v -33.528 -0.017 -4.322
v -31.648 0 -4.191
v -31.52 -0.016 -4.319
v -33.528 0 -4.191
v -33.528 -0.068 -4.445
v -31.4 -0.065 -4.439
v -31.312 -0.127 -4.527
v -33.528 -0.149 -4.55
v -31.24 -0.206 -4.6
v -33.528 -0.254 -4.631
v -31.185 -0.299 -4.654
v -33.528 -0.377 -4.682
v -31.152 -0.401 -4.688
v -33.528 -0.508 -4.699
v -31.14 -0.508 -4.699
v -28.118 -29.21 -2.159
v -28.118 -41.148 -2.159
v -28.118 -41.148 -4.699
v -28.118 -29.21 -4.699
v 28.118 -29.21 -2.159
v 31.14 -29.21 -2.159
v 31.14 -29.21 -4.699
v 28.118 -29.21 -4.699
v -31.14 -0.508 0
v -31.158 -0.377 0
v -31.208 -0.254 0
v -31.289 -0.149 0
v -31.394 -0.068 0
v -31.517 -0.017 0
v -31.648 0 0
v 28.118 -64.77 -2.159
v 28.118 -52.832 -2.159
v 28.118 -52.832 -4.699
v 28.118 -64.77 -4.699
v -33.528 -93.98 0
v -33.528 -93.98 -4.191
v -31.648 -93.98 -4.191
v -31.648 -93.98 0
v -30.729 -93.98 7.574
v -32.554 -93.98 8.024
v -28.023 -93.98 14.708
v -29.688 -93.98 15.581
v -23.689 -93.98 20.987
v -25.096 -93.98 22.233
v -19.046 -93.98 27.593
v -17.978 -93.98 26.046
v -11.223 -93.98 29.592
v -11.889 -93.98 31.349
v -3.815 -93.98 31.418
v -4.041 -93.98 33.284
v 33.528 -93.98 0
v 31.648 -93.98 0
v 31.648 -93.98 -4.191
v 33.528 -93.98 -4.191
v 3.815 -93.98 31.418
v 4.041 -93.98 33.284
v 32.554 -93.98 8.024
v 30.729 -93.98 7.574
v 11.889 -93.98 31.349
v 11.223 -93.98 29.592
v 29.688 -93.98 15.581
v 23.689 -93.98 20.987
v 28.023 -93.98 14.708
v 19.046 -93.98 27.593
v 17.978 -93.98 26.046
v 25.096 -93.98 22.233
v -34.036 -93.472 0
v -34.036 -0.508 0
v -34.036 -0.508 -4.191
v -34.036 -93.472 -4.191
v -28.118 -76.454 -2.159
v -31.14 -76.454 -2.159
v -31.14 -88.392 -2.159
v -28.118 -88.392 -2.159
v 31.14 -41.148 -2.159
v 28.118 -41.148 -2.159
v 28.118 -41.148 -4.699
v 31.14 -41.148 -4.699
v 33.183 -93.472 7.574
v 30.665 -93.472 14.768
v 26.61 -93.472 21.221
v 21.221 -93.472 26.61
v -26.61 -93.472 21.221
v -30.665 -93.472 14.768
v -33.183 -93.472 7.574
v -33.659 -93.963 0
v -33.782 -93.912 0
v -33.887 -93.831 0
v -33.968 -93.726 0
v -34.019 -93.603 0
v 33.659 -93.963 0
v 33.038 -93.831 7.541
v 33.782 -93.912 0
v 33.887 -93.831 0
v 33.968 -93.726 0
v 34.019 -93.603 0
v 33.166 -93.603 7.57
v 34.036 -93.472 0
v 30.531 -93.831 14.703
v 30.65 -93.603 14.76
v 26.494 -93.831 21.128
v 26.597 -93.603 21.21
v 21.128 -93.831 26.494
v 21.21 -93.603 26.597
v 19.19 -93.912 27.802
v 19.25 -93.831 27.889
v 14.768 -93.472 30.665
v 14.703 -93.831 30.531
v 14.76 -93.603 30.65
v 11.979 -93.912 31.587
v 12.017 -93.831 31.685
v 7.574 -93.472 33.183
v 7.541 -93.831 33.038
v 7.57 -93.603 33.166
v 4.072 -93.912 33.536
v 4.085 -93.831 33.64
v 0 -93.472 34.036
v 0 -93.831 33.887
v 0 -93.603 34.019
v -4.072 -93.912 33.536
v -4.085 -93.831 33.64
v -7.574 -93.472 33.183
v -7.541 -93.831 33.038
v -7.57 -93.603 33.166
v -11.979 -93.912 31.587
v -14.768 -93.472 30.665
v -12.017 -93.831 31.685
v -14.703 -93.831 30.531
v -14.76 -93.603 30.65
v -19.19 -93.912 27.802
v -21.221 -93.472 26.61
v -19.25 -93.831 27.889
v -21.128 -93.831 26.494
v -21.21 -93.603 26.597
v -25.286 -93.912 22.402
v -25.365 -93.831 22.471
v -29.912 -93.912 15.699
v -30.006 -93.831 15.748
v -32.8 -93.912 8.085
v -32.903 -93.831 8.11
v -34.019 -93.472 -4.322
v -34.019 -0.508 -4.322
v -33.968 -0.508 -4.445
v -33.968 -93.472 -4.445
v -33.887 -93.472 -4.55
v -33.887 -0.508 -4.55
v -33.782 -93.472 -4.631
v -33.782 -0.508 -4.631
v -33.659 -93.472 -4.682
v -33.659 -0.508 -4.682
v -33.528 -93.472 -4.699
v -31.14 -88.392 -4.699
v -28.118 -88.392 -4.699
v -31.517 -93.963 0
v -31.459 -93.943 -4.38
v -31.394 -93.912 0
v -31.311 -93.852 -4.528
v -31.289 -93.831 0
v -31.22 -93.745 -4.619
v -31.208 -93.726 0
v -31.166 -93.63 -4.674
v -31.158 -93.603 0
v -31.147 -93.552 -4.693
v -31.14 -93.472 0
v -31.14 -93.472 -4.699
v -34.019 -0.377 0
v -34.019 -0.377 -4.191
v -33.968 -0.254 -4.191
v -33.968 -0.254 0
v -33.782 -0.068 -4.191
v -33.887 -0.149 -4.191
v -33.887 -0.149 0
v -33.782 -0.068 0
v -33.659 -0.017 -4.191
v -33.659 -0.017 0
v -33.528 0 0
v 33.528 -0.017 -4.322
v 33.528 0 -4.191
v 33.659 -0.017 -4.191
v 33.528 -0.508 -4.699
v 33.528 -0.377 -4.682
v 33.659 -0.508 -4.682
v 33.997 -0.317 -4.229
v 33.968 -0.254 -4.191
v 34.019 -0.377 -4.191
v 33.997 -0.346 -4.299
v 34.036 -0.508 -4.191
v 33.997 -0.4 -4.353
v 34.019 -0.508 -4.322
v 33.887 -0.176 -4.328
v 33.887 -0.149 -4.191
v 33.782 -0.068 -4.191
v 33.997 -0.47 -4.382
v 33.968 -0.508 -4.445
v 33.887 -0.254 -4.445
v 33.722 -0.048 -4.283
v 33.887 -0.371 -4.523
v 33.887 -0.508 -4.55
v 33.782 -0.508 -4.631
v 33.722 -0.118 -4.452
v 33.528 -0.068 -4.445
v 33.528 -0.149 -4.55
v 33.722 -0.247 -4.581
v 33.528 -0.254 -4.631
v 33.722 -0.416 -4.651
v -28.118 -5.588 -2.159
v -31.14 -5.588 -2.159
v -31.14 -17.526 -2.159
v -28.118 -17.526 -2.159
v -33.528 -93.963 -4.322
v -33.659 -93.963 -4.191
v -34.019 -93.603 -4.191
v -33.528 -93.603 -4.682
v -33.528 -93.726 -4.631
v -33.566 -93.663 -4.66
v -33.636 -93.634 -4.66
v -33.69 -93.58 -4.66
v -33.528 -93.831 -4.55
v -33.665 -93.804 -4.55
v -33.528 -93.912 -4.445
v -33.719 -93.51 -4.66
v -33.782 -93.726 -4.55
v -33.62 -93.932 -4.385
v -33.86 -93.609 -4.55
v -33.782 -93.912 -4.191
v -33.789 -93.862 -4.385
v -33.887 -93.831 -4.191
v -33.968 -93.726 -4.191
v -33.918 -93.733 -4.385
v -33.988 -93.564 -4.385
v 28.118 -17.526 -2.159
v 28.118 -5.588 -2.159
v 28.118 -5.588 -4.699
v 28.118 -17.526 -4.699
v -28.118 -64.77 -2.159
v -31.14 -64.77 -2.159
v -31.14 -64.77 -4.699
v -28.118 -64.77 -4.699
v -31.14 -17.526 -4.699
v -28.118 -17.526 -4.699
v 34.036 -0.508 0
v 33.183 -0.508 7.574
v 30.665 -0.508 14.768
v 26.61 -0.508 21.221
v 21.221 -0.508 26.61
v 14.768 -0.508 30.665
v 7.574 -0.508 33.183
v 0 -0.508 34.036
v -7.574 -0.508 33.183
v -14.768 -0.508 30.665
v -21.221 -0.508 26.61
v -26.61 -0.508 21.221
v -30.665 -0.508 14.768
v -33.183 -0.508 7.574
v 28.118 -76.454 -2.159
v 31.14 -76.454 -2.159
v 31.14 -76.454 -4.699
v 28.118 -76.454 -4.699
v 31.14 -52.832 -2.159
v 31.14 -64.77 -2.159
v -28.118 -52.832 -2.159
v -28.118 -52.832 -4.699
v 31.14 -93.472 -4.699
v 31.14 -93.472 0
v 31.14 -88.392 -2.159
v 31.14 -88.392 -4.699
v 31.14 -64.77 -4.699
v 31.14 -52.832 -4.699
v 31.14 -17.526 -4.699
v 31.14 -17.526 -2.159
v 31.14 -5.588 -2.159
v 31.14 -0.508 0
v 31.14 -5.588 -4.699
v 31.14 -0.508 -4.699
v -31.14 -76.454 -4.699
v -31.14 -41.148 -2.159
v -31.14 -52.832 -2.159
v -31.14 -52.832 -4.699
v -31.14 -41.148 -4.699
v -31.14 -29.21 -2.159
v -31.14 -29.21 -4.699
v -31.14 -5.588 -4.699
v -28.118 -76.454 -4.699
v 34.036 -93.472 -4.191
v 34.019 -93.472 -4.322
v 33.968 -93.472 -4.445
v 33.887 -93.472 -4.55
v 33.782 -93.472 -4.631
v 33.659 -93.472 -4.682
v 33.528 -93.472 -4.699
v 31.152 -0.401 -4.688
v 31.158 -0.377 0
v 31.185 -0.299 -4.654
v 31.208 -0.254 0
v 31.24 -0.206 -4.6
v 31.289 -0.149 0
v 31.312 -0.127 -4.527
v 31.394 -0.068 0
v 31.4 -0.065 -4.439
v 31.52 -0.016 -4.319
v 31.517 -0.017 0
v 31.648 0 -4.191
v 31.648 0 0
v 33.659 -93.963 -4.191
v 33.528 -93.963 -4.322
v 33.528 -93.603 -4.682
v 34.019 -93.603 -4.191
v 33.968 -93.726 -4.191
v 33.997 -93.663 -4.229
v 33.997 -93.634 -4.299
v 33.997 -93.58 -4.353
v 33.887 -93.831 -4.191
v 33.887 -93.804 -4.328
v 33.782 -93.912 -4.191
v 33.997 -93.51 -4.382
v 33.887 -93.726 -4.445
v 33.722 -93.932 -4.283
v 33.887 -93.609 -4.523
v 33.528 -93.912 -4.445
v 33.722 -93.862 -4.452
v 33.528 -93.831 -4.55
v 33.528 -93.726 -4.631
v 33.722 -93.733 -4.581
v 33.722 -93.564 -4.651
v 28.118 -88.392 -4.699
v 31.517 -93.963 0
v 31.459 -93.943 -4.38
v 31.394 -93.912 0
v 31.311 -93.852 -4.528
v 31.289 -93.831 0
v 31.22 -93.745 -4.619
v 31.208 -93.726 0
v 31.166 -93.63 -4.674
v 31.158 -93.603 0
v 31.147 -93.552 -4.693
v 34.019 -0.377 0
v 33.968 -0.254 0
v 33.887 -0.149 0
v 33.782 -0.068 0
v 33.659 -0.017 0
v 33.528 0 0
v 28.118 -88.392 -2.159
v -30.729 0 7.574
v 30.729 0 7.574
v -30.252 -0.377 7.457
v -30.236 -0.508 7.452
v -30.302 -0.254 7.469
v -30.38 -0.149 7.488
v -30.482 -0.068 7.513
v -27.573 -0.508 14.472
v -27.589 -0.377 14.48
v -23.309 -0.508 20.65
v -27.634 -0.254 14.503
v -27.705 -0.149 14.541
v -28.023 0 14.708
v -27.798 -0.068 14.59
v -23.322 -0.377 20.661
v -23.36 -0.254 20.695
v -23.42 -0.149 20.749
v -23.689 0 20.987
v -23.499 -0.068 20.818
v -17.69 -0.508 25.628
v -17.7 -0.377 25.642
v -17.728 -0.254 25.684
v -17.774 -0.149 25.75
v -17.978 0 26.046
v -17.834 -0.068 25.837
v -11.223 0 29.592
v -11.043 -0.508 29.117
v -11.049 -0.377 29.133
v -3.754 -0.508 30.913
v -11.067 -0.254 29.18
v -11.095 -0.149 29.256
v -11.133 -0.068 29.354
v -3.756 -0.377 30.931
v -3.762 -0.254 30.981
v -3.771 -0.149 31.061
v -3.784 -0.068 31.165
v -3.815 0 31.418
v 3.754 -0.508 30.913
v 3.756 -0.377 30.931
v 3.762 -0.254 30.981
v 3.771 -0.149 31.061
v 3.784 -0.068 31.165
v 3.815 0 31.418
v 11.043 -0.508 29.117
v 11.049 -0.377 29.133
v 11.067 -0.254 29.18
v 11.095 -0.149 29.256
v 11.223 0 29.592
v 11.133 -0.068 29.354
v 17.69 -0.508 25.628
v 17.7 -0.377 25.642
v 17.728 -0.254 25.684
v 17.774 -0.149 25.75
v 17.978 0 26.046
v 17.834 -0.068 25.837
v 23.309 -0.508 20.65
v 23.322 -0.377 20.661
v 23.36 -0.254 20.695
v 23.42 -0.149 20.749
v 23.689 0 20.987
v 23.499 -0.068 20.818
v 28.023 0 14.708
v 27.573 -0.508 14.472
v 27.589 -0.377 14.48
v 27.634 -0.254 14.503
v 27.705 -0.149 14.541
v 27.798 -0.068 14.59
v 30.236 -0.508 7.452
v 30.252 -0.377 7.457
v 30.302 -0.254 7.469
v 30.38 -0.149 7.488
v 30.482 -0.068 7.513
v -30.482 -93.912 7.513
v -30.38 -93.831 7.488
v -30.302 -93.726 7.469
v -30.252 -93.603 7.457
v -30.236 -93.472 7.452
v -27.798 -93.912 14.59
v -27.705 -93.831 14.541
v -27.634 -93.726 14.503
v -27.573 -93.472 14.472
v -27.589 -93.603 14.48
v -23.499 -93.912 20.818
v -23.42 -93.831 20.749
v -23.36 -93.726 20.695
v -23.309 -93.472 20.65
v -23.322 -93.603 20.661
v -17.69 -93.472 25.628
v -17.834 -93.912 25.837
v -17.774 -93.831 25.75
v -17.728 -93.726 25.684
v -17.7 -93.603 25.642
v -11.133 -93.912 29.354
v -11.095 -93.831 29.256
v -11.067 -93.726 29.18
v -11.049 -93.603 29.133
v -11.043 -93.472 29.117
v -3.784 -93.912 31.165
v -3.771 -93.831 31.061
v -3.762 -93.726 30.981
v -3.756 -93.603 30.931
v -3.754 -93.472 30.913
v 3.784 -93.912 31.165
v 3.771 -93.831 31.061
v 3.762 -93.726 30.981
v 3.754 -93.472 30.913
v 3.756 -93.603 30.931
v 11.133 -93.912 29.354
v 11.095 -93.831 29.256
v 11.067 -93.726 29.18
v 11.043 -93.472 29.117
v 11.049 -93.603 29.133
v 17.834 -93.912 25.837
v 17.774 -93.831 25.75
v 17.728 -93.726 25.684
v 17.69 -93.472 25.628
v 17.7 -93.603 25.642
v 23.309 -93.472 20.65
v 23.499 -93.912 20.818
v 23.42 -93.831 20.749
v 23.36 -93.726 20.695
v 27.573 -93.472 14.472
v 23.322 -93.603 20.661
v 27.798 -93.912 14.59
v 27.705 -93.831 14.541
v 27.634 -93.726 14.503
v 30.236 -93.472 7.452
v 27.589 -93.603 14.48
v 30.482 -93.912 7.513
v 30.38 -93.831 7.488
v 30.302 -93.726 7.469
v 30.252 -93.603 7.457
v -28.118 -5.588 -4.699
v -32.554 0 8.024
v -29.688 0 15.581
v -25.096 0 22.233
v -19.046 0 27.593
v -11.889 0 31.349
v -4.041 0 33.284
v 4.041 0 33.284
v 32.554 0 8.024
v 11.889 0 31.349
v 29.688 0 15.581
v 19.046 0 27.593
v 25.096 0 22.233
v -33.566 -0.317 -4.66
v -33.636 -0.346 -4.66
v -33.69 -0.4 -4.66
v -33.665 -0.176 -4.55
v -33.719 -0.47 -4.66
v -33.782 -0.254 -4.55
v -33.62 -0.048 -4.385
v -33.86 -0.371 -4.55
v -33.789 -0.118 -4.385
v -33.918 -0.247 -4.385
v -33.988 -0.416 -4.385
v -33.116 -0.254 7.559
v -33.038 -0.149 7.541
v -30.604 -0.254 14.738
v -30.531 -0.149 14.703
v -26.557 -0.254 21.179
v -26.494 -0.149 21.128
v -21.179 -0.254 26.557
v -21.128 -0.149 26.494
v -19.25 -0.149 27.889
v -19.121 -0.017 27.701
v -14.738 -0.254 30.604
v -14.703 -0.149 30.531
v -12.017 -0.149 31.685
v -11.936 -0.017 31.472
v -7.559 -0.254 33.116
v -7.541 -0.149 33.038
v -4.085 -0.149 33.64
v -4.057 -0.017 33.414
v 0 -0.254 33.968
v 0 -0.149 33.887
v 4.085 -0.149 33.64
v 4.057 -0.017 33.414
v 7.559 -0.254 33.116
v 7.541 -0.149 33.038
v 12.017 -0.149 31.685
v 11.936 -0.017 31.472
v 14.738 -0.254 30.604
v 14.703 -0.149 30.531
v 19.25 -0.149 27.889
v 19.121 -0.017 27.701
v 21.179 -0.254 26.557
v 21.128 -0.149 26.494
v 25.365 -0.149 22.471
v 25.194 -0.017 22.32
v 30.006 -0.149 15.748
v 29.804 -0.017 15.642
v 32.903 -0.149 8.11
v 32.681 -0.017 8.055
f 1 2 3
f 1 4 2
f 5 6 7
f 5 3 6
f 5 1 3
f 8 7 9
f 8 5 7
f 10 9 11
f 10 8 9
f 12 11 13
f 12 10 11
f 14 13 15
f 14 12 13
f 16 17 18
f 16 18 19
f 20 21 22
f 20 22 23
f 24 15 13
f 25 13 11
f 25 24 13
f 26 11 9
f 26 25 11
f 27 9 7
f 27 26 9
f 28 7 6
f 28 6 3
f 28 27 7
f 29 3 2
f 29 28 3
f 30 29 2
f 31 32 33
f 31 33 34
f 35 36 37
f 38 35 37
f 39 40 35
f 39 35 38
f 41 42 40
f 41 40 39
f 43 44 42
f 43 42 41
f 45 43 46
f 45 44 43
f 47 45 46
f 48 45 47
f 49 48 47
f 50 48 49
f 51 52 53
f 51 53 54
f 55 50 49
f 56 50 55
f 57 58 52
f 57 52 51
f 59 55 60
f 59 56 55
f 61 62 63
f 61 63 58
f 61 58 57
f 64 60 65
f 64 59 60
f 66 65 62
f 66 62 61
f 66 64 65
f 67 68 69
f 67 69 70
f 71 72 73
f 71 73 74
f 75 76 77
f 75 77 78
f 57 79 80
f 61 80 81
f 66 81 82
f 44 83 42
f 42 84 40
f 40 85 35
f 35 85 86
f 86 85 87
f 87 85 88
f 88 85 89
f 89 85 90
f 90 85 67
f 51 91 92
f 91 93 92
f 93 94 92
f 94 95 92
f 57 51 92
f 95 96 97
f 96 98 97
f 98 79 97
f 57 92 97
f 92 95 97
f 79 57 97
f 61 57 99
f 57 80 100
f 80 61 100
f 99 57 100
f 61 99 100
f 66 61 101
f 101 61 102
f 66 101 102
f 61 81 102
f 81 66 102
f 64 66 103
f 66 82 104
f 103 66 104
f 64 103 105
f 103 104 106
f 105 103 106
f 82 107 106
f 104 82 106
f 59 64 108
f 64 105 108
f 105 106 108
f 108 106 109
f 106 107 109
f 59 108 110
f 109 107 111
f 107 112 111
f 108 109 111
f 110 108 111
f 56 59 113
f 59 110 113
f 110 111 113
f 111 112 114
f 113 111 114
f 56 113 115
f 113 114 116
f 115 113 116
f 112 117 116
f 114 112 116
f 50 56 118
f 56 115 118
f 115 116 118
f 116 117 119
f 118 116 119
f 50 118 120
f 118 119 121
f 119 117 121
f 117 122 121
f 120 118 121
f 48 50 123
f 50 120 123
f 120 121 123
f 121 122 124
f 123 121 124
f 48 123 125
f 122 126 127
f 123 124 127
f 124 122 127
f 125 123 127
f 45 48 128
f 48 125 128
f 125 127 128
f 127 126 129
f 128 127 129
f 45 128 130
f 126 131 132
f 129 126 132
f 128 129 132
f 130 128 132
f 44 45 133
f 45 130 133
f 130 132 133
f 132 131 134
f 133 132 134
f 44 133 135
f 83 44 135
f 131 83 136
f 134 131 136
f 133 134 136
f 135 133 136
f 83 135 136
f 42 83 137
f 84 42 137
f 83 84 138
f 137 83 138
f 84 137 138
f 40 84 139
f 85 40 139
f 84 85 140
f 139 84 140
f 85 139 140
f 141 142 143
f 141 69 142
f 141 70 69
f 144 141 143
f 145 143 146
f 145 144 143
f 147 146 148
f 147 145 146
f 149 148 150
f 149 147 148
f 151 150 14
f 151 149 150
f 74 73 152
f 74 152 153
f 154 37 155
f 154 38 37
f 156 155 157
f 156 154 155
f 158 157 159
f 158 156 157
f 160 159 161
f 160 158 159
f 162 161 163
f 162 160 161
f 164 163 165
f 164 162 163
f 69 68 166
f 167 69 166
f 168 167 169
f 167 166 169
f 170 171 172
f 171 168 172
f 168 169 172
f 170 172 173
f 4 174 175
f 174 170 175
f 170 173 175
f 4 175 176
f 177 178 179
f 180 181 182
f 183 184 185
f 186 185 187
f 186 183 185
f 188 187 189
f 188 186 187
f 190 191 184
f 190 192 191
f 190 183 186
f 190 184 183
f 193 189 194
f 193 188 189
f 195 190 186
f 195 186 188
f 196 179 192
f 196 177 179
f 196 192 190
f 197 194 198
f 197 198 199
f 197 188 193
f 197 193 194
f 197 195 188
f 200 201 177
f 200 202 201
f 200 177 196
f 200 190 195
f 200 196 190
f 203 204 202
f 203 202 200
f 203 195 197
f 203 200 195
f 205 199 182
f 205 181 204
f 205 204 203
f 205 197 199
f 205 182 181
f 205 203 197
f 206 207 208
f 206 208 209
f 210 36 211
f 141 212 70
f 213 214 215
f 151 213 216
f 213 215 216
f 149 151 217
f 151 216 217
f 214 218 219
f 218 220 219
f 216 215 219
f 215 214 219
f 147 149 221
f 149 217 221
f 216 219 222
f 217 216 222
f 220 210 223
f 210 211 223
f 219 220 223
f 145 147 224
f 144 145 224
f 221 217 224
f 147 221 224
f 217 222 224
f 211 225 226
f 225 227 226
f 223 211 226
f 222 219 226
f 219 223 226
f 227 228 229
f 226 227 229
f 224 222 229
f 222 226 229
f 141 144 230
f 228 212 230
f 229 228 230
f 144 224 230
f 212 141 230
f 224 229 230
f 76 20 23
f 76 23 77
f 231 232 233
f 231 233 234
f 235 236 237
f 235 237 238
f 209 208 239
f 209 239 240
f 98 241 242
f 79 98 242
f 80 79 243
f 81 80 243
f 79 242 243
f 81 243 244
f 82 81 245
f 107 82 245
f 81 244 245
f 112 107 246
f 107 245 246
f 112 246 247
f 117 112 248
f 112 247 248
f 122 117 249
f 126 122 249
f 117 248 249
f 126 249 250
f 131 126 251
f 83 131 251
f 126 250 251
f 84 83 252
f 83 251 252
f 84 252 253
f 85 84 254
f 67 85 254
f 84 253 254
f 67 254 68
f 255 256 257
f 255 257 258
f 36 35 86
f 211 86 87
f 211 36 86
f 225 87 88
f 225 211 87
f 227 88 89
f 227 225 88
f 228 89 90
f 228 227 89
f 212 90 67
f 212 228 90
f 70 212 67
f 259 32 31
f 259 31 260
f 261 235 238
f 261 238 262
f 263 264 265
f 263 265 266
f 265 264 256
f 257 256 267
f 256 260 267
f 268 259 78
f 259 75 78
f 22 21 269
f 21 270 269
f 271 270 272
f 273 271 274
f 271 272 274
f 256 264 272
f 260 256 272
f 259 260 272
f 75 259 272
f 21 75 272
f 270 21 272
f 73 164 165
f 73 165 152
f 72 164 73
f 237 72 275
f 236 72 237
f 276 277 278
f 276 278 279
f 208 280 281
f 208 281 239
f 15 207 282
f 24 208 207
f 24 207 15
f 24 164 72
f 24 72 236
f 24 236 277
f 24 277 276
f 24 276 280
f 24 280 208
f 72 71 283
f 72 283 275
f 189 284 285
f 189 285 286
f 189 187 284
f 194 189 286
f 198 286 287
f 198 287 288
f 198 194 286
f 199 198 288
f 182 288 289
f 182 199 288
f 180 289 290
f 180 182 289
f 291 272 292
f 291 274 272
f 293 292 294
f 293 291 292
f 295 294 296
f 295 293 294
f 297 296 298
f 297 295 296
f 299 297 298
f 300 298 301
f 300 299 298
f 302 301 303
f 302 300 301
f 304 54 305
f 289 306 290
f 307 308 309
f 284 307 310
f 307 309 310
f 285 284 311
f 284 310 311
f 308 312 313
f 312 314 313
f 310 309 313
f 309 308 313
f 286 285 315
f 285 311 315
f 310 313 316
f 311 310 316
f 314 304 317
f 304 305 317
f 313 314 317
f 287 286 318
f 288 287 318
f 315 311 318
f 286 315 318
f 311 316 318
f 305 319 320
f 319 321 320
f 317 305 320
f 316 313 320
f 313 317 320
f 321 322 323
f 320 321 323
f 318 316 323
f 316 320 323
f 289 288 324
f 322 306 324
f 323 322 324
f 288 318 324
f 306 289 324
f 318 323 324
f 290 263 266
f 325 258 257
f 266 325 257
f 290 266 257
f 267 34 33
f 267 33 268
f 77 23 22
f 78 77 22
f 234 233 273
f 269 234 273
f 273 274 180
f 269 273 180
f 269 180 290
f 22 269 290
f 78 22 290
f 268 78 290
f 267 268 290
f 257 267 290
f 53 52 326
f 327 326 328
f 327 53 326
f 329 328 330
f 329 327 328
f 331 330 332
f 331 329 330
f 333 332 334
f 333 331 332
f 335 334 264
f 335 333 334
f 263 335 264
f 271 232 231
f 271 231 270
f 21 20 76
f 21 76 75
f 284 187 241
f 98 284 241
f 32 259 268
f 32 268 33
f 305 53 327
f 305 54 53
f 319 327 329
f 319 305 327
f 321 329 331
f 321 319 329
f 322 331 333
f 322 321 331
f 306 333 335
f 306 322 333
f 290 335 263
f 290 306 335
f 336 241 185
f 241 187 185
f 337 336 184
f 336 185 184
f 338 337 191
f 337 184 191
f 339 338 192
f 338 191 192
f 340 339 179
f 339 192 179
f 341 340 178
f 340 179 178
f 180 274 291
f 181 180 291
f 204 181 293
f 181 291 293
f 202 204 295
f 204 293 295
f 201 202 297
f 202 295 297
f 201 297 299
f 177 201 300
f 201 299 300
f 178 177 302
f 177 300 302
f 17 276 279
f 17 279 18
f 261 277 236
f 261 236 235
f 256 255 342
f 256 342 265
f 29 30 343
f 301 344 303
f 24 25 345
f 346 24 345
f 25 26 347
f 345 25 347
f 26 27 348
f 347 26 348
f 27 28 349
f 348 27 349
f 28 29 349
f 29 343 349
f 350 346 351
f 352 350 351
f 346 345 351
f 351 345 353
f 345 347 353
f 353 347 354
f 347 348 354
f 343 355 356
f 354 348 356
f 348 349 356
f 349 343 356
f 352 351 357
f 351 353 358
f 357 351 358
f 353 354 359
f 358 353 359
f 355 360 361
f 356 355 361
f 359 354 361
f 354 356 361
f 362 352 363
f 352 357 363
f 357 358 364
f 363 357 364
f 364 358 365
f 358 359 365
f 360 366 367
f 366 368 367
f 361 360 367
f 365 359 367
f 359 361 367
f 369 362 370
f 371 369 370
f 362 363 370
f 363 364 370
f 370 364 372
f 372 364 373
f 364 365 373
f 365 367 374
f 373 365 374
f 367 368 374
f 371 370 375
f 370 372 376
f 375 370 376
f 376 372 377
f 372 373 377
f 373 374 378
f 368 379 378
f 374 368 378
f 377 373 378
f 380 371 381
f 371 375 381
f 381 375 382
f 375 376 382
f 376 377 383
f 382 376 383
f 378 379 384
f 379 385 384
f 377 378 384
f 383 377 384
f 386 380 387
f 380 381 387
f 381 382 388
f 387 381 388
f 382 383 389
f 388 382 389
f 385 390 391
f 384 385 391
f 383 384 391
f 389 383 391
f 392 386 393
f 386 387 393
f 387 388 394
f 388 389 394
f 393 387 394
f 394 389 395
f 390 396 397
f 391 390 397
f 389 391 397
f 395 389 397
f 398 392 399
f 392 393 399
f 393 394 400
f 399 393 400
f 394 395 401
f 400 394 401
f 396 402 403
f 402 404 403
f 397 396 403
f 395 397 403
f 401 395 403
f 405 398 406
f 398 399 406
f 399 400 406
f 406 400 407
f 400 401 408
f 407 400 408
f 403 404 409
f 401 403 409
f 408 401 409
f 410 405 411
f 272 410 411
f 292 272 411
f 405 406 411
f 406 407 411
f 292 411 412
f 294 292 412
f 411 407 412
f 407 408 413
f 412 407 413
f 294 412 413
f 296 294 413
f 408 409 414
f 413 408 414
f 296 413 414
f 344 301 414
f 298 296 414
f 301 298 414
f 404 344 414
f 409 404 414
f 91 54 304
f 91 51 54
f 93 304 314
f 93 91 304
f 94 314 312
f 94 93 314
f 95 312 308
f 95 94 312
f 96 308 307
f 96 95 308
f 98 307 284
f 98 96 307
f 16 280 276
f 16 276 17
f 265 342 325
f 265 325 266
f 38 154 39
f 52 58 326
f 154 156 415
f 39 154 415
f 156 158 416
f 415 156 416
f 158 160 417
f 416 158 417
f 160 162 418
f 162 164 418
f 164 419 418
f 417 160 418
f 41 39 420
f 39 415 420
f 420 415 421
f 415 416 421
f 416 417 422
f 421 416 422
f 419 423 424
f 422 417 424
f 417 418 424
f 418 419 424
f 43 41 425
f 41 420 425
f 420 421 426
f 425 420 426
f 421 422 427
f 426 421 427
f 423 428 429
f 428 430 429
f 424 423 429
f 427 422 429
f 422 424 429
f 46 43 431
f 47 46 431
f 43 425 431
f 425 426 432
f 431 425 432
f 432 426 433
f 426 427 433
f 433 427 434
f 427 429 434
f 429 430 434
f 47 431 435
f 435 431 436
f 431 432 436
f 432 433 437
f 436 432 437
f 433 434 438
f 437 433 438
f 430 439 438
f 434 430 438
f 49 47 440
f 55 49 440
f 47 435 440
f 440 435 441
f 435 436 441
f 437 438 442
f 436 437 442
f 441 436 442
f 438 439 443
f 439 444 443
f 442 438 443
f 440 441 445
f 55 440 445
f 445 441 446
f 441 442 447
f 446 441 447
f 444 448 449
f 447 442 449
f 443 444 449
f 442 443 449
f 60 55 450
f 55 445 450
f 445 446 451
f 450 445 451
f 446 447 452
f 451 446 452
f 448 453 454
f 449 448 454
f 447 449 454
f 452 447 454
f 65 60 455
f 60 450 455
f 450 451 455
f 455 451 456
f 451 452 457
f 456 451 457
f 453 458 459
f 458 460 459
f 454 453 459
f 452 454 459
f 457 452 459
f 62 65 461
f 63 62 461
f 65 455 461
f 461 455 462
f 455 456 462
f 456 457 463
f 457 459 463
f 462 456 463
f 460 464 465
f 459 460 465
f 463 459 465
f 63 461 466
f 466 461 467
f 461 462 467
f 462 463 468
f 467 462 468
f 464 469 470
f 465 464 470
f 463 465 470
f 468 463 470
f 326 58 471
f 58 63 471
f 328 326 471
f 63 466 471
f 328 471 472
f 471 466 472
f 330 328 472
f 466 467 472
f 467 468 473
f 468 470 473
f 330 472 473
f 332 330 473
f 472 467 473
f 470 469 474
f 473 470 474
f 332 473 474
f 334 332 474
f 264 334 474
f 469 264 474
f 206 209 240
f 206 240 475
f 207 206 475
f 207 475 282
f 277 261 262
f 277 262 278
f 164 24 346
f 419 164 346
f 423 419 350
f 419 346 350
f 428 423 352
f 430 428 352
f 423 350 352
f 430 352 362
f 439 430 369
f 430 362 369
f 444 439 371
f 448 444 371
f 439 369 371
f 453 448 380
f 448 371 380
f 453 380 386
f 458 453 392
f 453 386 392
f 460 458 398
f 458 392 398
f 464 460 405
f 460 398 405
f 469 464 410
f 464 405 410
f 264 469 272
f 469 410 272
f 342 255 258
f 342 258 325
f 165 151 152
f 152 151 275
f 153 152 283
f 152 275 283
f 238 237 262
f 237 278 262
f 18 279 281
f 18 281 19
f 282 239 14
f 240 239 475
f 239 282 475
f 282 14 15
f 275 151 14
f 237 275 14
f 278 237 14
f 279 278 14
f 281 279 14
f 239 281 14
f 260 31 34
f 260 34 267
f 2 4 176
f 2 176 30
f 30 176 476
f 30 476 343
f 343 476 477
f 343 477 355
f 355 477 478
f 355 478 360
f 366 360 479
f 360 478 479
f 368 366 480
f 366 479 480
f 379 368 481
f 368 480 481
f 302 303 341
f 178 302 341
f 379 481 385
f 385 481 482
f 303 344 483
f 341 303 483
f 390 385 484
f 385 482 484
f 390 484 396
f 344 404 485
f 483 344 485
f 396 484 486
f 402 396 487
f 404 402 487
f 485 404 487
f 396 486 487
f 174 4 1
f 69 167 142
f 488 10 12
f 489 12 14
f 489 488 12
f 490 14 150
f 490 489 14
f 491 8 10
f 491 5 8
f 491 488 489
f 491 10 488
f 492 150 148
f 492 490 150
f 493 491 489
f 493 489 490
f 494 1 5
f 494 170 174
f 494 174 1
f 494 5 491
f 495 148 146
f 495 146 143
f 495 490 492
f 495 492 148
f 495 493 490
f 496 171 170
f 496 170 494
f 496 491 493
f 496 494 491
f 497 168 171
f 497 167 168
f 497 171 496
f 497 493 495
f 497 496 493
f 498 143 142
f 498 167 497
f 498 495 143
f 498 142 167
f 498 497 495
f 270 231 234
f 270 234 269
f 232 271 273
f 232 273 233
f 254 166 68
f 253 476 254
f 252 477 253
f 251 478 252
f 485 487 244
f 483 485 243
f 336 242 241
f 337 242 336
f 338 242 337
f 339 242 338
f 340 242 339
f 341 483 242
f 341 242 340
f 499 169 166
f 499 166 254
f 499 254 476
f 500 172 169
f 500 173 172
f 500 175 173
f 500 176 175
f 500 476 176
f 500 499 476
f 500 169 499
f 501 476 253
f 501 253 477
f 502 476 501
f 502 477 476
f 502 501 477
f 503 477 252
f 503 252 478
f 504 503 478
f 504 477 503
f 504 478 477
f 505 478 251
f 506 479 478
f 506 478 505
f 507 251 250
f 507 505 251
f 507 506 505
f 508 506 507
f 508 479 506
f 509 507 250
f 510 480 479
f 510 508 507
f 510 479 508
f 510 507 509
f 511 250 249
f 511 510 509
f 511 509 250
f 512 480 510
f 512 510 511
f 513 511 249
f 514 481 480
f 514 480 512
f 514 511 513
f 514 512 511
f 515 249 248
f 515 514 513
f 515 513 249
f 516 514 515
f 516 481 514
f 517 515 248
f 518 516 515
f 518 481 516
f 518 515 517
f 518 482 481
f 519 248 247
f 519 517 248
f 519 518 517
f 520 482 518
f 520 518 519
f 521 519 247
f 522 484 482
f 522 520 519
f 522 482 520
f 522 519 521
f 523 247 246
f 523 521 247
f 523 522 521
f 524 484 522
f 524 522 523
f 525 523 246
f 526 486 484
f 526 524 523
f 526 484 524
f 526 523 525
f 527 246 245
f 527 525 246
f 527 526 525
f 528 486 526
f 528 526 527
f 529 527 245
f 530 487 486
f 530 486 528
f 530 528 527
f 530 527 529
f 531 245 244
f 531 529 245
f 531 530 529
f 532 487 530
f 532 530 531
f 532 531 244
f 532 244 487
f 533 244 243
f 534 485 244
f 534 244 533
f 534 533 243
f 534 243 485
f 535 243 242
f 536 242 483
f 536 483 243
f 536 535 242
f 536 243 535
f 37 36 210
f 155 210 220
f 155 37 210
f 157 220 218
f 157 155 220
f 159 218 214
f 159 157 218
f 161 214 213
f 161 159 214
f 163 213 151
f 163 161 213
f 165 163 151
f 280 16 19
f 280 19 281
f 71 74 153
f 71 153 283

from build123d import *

# Parameters (mm, degrees)
F1_DEPTH = 93.98
F3_START = -2.159
F3_DEPTH = 2.54
F4_R     = 0.508


with BuildPart() as f1:
    # F0 (on Front) → F1 (new body)
    with BuildSketch(Plane.XZ):
        with BuildLine():
            ThreePointArc((-31.1404, 0), (0, 31.1404), (31.1404, 0))
            Line((31.1404, 0), (31.1404, -2.159))
            Line((31.1404, -2.159), (34.036, -2.159))
            Line((34.036, -2.159), (34.036, 0))
            ThreePointArc((34.036, 0), (0, 34.036), (-34.036, 0))
            Line((-34.036, 0), (-34.036, -2.159))
            Line((-34.036, -2.159), (-31.1404, -2.159))
            Line((-31.1404, -2.159), (-31.1404, 0))
        make_face()
    extrude(amount=F1_DEPTH)

    # F2 (on Top) → F3 (join)
    with BuildSketch(Plane.XY.offset(F3_START)):
        Polygon((-31.1404, -29.21), (-31.1404, -17.526), (-28.1178, -17.526), (-28.1178, -5.588), (-31.1404, -5.588), (-31.1404, 0), (-34.036, 0), (-34.036, -93.98), (-31.1404, -93.98), (-31.1404, -88.392), (-28.1178, -88.392), (-28.1178, -76.454), (-31.1404, -76.454), (-31.1404, -64.77), (-28.1178, -64.77), (-28.1178, -52.832), (-31.1404, -52.832), (-31.1404, -41.148), (-28.1178, -41.148), (-28.1178, -29.21), align=None)
        Polygon((28.1178, -17.526), (31.1404, -17.526), (31.1404, -29.21), (28.1178, -29.21), (28.1178, -41.148), (31.1404, -41.148), (31.1404, -52.832), (28.1178, -52.832), (28.1178, -64.77), (31.1404, -64.77), (31.1404, -76.454), (28.1178, -76.454), (28.1178, -88.392), (31.1404, -88.392), (31.1404, -93.98), (34.036, -93.98), (34.036, 0), (31.1404, 0), (31.1404, -5.588), (28.1178, -5.588), align=None)
    extrude(amount=-F3_DEPTH)

    # F4
    f4_edges = [f1.edges().sort_by_distance(p)[0] for p in [
        (0, -93.98, 31.1404),
        (31.1404, -93.98, -2.3495),
        (32.5882, -93.98, -4.699),
        (34.036, -93.98, -2.3495),
        (0, -93.98, 34.036),
        (-34.036, -93.98, -2.3495),
        (-32.5882, -93.98, -4.699),
        (-31.1404, -93.98, -2.3495),
        (0, 0, 31.1404),
        (31.1404, 0, -2.3495),
        (32.5882, 0, -4.699),
        (34.036, 0, -2.3495),
        (0, 0, 34.036),
        (-34.036, 0, -2.3495),
        (-32.5882, 0, -4.699),
        (-31.1404, 0, -2.3495),
        (34.036, -46.99, -4.699),
        (-34.036, -46.99, -4.699),
    ]]
    fillet(f4_edges, radius=F4_R)


solid = f1.part
